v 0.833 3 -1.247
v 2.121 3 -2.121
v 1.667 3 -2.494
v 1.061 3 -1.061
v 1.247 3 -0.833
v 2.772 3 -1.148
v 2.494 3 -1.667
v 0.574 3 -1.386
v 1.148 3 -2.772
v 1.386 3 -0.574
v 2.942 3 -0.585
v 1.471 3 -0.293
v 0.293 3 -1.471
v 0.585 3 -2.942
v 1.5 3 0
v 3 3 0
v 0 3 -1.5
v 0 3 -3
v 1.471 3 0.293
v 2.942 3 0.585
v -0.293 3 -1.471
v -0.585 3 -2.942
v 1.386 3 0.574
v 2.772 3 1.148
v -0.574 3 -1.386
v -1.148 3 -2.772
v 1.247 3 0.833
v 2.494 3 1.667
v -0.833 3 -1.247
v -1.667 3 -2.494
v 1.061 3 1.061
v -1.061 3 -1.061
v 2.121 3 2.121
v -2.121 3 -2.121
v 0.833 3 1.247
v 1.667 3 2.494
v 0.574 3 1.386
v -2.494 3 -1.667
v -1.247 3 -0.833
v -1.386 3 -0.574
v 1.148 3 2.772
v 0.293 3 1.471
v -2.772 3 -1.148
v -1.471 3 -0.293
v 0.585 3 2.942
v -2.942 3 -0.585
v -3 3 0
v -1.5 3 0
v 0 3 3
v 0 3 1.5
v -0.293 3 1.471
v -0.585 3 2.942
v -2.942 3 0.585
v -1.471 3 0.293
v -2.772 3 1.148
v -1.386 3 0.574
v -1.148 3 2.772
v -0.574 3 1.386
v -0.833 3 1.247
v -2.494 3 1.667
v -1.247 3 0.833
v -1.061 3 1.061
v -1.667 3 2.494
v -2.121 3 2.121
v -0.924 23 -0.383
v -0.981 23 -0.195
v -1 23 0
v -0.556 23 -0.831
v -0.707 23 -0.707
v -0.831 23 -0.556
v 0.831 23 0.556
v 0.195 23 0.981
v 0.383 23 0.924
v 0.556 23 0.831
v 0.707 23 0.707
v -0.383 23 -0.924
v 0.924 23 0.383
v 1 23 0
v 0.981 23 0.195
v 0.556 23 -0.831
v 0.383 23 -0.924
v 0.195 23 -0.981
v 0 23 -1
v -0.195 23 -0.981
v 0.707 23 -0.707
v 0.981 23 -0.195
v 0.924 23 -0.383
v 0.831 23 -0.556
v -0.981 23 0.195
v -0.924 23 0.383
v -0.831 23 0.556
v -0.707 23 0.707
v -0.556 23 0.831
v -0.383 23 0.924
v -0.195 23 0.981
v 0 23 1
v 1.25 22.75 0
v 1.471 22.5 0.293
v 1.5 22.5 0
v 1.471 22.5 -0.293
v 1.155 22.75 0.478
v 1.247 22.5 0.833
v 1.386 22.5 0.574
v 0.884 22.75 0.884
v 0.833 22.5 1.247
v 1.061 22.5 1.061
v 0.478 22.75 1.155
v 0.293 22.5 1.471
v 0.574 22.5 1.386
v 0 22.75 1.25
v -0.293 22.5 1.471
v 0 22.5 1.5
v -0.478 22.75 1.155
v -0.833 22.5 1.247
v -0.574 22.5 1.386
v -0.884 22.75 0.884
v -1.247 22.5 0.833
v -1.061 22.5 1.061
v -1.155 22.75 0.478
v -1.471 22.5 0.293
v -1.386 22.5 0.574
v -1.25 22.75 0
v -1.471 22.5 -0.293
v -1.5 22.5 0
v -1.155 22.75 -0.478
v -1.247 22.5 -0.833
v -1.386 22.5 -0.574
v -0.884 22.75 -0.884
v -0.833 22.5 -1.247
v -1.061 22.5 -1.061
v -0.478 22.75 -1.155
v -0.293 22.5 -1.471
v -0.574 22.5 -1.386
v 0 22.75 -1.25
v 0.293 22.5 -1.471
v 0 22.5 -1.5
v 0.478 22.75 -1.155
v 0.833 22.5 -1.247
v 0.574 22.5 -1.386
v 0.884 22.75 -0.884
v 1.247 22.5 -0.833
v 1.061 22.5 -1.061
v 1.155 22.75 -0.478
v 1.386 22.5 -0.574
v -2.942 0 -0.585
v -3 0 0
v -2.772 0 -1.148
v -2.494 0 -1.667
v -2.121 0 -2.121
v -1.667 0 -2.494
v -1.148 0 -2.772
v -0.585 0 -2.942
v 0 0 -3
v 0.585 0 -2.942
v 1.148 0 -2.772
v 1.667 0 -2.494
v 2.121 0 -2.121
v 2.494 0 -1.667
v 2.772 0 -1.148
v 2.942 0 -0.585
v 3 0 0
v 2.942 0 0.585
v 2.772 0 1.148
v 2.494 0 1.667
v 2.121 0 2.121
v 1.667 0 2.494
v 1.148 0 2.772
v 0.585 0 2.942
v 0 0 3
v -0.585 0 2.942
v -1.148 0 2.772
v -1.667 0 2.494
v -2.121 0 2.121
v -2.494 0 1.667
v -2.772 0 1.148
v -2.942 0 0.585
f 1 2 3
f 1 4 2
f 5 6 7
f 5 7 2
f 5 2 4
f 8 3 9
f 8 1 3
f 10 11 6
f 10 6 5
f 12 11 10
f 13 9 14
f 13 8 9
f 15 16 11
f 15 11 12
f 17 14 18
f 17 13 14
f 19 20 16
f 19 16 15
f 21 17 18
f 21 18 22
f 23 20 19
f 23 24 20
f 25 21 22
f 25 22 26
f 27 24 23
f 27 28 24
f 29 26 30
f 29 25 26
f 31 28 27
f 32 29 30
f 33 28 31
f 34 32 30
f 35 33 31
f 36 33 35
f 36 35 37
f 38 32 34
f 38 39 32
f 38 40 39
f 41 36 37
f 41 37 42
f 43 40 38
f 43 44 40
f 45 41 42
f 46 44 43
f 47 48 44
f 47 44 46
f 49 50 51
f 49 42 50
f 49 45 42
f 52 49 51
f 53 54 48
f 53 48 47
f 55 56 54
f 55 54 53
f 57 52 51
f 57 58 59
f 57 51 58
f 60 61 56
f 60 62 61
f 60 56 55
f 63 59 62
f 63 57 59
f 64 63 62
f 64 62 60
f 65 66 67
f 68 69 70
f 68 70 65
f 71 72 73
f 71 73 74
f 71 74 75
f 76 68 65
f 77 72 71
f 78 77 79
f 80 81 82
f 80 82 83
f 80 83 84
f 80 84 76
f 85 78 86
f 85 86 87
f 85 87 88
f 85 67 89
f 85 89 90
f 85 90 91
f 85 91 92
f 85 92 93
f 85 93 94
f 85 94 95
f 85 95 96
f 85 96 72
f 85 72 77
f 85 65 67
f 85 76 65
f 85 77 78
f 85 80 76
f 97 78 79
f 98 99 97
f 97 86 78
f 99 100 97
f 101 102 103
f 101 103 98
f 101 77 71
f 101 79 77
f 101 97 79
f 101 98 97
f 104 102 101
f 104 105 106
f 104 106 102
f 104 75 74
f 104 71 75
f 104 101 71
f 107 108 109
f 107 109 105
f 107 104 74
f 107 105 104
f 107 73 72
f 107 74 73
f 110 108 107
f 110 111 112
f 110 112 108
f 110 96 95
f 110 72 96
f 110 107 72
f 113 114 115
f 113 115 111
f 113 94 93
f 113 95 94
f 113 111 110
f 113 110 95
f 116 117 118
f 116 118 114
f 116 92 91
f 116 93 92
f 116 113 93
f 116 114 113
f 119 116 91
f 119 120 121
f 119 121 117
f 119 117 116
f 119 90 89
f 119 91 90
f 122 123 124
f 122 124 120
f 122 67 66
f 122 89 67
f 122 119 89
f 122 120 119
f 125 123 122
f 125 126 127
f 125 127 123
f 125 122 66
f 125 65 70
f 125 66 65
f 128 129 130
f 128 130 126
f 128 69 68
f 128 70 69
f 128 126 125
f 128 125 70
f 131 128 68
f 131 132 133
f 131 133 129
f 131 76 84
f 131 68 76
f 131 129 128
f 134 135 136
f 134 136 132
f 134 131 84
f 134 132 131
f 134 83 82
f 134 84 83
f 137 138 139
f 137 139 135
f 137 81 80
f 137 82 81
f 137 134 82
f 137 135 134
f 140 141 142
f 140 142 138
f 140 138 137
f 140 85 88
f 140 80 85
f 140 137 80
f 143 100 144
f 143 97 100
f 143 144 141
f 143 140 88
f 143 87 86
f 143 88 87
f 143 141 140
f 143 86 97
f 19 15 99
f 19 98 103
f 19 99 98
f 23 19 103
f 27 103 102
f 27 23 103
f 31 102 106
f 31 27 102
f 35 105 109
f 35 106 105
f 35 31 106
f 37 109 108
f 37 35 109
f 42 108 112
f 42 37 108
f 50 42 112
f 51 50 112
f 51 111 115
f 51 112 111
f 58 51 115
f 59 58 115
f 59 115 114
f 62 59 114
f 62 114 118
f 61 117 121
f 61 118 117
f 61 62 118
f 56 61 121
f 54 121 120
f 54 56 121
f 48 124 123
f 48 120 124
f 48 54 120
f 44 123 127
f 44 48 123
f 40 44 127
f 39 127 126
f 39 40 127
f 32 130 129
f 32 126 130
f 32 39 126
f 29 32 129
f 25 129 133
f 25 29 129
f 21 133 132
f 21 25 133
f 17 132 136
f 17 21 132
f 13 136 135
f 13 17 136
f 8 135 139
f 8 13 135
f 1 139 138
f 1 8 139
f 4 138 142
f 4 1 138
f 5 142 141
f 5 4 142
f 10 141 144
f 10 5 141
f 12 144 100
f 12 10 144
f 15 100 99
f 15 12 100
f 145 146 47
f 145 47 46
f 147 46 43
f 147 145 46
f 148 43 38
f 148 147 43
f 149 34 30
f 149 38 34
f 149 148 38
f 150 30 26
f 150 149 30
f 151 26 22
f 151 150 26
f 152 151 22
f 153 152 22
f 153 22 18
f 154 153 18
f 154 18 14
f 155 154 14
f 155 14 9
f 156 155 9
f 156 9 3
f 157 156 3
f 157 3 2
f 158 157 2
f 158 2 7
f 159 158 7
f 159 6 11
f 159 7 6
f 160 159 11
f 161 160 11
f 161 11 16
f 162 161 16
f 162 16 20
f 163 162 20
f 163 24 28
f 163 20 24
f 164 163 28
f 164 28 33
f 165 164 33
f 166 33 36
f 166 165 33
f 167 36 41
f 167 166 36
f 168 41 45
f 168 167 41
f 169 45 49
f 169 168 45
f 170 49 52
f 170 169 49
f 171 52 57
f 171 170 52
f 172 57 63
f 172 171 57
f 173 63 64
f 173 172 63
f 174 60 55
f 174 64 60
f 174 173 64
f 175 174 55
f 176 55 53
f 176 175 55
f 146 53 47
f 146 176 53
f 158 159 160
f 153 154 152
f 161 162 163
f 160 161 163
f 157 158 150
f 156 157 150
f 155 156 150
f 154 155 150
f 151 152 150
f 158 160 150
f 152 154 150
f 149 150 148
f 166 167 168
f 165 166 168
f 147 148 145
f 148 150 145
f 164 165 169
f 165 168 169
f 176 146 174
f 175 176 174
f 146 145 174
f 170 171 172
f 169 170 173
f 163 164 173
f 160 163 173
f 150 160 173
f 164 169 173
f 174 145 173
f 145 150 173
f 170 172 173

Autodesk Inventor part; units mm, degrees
ref_plane "YZ Plane" through (0, 0, 0) normal (1, 0, 0) x (0, 1, 0)
ref_plane "XZ Plane" through (0, 0, 0) normal (0, 1, 0) x (-1, 0, 0)
ref_plane "XY Plane" through (0, 0, 0) normal (0, 0, 1) x (1, 0, 0)
sketch "Sketch1" plane through (0, 0, 0) normal (0, 1, 0) x (-1, 0, 0)
  circle A0 centre (0, 0) radius 3
  dimension "d0" = 6
extrude "Extrusion1" add sketch "Sketch1" along normal blind 3
sketch "Sketch2" plane through (0, 3, 0) normal (0, 1, 0) x (1, 0, 0)
  circle A0 centre (0, 0) radius 1.5
  dimension "d3" = 3
extrude "Extrusion2" add sketch "Sketch2" along normal blind 20
thread "Thread1" size "M3x0.5" class "6g" standard "ANSI Metric M Profile" length 10 offset 0.5
chamfer "Chamfer1" distance 0.5 angle 45 1 edges at (-1.5, 23, 0)
properties part number "reverse gear link stud"
